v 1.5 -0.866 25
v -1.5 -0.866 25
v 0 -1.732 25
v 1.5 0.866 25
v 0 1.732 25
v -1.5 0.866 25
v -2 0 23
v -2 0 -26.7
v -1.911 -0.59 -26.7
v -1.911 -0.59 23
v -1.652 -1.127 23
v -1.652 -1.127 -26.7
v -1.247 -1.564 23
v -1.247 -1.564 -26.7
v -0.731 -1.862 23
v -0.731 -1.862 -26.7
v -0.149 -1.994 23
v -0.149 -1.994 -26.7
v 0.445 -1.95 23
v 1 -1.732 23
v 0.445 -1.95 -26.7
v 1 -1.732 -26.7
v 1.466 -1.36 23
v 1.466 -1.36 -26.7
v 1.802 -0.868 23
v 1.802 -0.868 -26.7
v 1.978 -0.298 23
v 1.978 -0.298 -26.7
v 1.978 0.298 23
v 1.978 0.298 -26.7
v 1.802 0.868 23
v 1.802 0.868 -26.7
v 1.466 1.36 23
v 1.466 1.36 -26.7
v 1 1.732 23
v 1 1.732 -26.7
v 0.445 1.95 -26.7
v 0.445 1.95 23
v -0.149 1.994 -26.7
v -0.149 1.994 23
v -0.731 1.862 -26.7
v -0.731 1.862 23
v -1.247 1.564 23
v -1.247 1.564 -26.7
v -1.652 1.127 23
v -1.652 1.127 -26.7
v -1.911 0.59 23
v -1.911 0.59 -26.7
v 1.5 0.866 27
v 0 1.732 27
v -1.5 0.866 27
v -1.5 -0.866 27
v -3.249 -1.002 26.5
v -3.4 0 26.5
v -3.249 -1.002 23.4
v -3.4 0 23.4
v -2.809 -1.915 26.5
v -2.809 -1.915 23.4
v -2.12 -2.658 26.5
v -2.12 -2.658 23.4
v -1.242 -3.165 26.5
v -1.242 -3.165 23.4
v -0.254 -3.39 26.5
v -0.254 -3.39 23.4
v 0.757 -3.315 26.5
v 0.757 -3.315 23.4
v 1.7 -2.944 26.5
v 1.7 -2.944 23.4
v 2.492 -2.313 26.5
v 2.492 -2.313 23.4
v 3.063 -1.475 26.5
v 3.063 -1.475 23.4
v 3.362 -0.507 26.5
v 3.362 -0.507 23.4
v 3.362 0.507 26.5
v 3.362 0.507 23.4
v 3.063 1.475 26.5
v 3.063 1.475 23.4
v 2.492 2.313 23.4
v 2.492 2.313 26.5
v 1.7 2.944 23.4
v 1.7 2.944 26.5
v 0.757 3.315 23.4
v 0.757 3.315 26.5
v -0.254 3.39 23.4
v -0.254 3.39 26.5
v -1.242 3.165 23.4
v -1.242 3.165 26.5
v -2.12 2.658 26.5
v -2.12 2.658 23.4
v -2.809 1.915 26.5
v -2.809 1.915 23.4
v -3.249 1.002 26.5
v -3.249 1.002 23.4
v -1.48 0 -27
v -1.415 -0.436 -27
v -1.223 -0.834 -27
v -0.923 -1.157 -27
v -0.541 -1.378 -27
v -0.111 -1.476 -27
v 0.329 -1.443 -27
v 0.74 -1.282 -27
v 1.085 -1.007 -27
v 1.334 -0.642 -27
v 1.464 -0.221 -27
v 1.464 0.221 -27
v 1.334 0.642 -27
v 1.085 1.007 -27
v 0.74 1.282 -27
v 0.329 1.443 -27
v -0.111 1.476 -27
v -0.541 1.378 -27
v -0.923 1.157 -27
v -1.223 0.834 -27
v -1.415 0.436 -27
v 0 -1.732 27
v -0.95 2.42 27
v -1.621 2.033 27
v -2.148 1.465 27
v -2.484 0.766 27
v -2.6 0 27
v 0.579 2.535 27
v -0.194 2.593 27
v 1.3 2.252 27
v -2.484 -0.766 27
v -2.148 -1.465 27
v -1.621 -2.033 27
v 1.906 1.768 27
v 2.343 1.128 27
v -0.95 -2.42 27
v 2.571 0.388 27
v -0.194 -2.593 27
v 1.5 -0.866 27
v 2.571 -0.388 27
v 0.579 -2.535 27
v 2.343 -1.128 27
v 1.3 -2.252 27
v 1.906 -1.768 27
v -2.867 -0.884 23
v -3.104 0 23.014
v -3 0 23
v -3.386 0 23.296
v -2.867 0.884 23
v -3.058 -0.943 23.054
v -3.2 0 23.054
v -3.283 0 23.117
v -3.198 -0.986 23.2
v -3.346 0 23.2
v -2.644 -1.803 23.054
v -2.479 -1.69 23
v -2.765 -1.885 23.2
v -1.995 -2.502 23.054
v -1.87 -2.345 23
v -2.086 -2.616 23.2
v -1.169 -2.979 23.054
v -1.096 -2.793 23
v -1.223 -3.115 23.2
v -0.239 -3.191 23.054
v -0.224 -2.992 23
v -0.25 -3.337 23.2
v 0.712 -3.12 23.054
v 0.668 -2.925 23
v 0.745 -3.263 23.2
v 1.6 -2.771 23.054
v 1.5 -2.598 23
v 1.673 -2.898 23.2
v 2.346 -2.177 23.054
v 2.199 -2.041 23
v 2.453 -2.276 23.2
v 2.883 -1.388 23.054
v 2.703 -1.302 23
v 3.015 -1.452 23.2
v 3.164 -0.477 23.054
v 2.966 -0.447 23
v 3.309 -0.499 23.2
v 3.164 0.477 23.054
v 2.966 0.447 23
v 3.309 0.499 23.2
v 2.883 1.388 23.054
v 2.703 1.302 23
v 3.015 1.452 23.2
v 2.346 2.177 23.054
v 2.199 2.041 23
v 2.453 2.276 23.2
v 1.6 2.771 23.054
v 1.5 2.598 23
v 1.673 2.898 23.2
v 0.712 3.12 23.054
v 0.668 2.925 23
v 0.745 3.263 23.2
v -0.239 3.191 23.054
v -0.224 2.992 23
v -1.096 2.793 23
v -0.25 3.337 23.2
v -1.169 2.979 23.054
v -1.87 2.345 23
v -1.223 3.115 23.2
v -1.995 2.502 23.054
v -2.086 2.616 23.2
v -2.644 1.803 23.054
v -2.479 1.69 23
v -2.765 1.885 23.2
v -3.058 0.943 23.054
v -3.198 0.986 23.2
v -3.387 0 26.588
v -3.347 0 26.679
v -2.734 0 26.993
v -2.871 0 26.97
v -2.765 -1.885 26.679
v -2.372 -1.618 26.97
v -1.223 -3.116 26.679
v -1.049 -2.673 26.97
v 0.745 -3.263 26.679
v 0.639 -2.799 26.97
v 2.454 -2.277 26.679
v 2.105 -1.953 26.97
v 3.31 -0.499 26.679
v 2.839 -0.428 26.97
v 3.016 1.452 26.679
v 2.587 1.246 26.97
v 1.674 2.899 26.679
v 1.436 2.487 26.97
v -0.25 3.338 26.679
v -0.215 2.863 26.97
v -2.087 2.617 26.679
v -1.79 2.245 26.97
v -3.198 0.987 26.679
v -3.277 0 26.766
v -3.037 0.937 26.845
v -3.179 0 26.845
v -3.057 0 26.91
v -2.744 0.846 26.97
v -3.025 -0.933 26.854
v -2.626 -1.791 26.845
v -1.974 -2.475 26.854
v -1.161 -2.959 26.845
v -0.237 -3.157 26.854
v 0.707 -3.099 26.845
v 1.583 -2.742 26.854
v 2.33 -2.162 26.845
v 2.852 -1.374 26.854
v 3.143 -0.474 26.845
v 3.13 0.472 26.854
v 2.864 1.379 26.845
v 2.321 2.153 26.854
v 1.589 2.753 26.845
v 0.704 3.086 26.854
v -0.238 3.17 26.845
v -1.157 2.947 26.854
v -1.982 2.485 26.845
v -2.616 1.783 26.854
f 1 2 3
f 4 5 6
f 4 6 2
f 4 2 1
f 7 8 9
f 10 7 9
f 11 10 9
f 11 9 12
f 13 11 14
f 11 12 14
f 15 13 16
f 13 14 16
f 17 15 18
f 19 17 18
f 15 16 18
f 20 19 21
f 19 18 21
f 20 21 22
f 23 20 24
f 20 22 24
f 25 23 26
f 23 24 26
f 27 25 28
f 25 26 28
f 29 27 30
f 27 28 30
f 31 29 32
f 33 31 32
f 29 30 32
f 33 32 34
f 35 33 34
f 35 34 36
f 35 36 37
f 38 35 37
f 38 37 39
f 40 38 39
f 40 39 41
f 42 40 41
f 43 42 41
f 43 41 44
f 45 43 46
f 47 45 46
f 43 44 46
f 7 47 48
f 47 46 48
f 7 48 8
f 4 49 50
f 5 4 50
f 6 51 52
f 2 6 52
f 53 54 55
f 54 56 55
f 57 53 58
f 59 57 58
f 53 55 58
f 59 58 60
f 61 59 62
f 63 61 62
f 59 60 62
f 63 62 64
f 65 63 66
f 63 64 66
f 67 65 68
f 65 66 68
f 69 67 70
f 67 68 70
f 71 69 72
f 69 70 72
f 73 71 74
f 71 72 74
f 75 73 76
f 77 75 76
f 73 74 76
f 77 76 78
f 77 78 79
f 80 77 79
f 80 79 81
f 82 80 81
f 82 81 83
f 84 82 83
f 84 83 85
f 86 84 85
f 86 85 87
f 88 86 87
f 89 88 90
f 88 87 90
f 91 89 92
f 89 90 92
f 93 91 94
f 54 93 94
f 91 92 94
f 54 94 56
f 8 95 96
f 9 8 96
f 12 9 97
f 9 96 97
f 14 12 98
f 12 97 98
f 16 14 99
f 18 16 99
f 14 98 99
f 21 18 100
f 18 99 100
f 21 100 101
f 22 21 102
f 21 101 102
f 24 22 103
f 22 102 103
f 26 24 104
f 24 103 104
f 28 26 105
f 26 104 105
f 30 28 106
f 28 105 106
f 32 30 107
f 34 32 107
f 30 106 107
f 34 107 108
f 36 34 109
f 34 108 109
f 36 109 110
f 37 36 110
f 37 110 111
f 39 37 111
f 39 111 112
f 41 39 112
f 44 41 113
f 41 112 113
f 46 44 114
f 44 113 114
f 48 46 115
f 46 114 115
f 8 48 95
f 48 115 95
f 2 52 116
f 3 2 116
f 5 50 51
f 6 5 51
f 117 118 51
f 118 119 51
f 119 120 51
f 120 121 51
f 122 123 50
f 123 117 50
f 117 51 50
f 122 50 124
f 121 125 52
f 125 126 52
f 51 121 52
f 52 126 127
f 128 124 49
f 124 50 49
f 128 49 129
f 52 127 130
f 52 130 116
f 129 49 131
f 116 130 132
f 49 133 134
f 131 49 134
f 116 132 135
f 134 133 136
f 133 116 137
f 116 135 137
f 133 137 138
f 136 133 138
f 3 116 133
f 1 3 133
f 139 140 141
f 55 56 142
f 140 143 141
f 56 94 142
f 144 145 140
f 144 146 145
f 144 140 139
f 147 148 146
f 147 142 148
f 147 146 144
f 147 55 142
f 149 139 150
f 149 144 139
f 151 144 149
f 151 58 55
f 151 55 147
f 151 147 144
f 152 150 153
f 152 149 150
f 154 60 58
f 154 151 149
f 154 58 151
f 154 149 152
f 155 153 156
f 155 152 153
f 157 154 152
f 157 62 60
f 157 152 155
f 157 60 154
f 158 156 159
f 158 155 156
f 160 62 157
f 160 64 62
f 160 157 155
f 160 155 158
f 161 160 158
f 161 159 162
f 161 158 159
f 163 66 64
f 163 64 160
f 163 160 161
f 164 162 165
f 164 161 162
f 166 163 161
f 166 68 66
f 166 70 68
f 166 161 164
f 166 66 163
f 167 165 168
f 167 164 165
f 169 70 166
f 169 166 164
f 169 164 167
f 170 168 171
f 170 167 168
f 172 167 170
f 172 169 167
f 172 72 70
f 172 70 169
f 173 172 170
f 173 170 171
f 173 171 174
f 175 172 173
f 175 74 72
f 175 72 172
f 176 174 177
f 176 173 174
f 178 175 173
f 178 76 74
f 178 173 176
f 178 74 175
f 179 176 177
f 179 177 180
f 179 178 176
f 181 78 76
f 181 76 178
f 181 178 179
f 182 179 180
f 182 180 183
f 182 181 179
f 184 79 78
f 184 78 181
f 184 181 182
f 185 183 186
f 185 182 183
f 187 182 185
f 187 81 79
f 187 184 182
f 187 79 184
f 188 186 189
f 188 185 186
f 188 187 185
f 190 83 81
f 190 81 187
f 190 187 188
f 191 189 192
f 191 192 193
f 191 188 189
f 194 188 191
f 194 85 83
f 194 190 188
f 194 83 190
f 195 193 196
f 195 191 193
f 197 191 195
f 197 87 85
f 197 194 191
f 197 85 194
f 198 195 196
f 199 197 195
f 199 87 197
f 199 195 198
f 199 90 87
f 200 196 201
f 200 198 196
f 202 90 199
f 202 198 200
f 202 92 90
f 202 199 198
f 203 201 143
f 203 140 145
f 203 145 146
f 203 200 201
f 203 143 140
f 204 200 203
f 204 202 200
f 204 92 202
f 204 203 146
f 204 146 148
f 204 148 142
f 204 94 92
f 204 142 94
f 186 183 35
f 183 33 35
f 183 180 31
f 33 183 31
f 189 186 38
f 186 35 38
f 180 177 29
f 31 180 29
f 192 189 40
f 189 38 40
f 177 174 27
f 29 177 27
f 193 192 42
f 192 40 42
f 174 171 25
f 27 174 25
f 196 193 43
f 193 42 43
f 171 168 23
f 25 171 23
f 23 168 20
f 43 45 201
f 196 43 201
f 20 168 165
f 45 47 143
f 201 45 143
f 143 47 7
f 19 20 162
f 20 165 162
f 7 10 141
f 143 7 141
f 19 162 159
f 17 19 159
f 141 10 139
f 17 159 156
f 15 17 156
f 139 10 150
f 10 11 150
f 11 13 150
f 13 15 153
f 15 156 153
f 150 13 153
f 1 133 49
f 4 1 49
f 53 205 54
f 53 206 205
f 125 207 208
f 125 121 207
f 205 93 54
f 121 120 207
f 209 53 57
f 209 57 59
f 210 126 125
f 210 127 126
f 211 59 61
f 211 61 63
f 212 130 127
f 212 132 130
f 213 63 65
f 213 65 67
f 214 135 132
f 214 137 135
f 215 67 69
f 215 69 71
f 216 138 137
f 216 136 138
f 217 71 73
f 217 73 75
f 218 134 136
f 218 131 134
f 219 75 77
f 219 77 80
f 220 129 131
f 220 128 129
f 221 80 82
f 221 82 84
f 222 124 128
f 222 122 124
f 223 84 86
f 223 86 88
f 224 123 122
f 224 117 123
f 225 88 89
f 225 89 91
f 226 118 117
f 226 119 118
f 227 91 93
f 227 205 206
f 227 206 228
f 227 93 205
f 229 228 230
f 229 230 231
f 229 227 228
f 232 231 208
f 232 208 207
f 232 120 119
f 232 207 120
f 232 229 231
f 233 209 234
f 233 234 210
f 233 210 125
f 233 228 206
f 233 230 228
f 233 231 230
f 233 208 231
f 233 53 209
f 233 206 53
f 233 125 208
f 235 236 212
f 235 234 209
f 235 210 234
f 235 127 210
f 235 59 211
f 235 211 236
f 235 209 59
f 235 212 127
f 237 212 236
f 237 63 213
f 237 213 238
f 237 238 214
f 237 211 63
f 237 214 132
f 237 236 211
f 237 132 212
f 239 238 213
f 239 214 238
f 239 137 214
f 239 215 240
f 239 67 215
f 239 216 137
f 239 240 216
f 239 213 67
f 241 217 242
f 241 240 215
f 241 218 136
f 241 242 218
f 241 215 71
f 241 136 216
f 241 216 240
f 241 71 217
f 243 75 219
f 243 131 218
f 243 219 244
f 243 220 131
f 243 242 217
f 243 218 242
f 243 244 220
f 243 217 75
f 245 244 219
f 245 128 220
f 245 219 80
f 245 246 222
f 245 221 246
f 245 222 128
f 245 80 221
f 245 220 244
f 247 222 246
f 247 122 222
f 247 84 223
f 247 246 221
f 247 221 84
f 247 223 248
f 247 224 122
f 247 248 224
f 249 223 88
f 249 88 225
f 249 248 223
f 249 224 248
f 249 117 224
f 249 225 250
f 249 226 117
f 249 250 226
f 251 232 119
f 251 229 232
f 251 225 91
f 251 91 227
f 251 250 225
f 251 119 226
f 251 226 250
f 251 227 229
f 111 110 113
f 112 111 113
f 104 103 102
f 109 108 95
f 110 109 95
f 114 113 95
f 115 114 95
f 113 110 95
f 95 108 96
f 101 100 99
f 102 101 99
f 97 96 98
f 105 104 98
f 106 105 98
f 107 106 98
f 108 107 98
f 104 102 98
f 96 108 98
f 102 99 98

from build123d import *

# Parameters (mm, degrees)
CHAMFER_1_SIZE      = 0.3
CHAMFER_1_SIZE2     = 0.519615242
FILLET_1_R          = 0.4
FILLET_2_SIZE       = 0.5
FILLET_2_SIZE_2     = 0.8
CUT_EXTRUDE_1_DEPTH = 2


with BuildPart() as part:
    # 草图2 → 旋转1 (revolve)
    with BuildSketch(Plane(origin=(0, 0, 0), x_dir=(0, 0, -1), z_dir=(1, 0, 0)), mode=Mode.PRIVATE) as revolve_1_sk:
        Polygon((-27, 0), (-27, 3.4), (-23, 3.4), (-23, 2), (27, 2), (27, 0), align=None)
    revolve(revolve_1_sk.sketch.rotate(Axis((0, 0, -27), (0, 0, 1)), 90), axis=Axis((0, 0, -27), (0, 0, 1)))

    # 倒角1
    chamfer_1_edges = [part.edges().sort_by_distance(p)[0] for p in [
        (2, 0, -27),
    ]]
    chamfer_1_side = [part.faces().sort_by_distance(p)[0] for p in [
        (2, 0, -2),
    ]]
    chamfer(chamfer_1_edges, length=CHAMFER_1_SIZE, length2=CHAMFER_1_SIZE2, reference=chamfer_1_side[0])

    # 圆角1
    fillet_1_edges = [part.edges().sort_by_distance(p)[0] for p in [
        (3.4, 0, 23),
    ]]
    fillet(fillet_1_edges, radius=FILLET_1_R)

    # 圆角2
    # an asymmetric fillet: 0.8, 0.5 mm, written as the material it takes off along each edge
    with BuildSketch(Plane(origin=(0, 0, 27), x_dir=(-1, 0, 0), z_dir=(0, 1, 0))) as fillet_2_piece_1:
        with BuildLine():
            Bezier((3.4, -FILLET_2_SIZE), (3.4, 0), (3.4 - FILLET_2_SIZE_2, 0), weights=[1, 0.707106781, 1])
            Line((3.4 - FILLET_2_SIZE_2, 0), (3.4, 0))
            Line((3.4, 0), (3.4, -FILLET_2_SIZE))
        make_face()
    revolve(axis=Axis((0, 0, 27), (0, 0, 1)), mode=Mode.SUBTRACT)

    # 草图3 → 切除-拉伸1 (cut)
    with BuildSketch(Plane.XY.offset(27)):
        Polygon((0, 1.732050808), (-1.5, 0.866025404), (-1.5, -0.866025404), (0, -1.732050808), (1.5, -0.866025404), (1.5, 0.866025404), align=None)
    extrude(amount=-CUT_EXTRUDE_1_DEPTH, mode=Mode.SUBTRACT)


solid = part.part
